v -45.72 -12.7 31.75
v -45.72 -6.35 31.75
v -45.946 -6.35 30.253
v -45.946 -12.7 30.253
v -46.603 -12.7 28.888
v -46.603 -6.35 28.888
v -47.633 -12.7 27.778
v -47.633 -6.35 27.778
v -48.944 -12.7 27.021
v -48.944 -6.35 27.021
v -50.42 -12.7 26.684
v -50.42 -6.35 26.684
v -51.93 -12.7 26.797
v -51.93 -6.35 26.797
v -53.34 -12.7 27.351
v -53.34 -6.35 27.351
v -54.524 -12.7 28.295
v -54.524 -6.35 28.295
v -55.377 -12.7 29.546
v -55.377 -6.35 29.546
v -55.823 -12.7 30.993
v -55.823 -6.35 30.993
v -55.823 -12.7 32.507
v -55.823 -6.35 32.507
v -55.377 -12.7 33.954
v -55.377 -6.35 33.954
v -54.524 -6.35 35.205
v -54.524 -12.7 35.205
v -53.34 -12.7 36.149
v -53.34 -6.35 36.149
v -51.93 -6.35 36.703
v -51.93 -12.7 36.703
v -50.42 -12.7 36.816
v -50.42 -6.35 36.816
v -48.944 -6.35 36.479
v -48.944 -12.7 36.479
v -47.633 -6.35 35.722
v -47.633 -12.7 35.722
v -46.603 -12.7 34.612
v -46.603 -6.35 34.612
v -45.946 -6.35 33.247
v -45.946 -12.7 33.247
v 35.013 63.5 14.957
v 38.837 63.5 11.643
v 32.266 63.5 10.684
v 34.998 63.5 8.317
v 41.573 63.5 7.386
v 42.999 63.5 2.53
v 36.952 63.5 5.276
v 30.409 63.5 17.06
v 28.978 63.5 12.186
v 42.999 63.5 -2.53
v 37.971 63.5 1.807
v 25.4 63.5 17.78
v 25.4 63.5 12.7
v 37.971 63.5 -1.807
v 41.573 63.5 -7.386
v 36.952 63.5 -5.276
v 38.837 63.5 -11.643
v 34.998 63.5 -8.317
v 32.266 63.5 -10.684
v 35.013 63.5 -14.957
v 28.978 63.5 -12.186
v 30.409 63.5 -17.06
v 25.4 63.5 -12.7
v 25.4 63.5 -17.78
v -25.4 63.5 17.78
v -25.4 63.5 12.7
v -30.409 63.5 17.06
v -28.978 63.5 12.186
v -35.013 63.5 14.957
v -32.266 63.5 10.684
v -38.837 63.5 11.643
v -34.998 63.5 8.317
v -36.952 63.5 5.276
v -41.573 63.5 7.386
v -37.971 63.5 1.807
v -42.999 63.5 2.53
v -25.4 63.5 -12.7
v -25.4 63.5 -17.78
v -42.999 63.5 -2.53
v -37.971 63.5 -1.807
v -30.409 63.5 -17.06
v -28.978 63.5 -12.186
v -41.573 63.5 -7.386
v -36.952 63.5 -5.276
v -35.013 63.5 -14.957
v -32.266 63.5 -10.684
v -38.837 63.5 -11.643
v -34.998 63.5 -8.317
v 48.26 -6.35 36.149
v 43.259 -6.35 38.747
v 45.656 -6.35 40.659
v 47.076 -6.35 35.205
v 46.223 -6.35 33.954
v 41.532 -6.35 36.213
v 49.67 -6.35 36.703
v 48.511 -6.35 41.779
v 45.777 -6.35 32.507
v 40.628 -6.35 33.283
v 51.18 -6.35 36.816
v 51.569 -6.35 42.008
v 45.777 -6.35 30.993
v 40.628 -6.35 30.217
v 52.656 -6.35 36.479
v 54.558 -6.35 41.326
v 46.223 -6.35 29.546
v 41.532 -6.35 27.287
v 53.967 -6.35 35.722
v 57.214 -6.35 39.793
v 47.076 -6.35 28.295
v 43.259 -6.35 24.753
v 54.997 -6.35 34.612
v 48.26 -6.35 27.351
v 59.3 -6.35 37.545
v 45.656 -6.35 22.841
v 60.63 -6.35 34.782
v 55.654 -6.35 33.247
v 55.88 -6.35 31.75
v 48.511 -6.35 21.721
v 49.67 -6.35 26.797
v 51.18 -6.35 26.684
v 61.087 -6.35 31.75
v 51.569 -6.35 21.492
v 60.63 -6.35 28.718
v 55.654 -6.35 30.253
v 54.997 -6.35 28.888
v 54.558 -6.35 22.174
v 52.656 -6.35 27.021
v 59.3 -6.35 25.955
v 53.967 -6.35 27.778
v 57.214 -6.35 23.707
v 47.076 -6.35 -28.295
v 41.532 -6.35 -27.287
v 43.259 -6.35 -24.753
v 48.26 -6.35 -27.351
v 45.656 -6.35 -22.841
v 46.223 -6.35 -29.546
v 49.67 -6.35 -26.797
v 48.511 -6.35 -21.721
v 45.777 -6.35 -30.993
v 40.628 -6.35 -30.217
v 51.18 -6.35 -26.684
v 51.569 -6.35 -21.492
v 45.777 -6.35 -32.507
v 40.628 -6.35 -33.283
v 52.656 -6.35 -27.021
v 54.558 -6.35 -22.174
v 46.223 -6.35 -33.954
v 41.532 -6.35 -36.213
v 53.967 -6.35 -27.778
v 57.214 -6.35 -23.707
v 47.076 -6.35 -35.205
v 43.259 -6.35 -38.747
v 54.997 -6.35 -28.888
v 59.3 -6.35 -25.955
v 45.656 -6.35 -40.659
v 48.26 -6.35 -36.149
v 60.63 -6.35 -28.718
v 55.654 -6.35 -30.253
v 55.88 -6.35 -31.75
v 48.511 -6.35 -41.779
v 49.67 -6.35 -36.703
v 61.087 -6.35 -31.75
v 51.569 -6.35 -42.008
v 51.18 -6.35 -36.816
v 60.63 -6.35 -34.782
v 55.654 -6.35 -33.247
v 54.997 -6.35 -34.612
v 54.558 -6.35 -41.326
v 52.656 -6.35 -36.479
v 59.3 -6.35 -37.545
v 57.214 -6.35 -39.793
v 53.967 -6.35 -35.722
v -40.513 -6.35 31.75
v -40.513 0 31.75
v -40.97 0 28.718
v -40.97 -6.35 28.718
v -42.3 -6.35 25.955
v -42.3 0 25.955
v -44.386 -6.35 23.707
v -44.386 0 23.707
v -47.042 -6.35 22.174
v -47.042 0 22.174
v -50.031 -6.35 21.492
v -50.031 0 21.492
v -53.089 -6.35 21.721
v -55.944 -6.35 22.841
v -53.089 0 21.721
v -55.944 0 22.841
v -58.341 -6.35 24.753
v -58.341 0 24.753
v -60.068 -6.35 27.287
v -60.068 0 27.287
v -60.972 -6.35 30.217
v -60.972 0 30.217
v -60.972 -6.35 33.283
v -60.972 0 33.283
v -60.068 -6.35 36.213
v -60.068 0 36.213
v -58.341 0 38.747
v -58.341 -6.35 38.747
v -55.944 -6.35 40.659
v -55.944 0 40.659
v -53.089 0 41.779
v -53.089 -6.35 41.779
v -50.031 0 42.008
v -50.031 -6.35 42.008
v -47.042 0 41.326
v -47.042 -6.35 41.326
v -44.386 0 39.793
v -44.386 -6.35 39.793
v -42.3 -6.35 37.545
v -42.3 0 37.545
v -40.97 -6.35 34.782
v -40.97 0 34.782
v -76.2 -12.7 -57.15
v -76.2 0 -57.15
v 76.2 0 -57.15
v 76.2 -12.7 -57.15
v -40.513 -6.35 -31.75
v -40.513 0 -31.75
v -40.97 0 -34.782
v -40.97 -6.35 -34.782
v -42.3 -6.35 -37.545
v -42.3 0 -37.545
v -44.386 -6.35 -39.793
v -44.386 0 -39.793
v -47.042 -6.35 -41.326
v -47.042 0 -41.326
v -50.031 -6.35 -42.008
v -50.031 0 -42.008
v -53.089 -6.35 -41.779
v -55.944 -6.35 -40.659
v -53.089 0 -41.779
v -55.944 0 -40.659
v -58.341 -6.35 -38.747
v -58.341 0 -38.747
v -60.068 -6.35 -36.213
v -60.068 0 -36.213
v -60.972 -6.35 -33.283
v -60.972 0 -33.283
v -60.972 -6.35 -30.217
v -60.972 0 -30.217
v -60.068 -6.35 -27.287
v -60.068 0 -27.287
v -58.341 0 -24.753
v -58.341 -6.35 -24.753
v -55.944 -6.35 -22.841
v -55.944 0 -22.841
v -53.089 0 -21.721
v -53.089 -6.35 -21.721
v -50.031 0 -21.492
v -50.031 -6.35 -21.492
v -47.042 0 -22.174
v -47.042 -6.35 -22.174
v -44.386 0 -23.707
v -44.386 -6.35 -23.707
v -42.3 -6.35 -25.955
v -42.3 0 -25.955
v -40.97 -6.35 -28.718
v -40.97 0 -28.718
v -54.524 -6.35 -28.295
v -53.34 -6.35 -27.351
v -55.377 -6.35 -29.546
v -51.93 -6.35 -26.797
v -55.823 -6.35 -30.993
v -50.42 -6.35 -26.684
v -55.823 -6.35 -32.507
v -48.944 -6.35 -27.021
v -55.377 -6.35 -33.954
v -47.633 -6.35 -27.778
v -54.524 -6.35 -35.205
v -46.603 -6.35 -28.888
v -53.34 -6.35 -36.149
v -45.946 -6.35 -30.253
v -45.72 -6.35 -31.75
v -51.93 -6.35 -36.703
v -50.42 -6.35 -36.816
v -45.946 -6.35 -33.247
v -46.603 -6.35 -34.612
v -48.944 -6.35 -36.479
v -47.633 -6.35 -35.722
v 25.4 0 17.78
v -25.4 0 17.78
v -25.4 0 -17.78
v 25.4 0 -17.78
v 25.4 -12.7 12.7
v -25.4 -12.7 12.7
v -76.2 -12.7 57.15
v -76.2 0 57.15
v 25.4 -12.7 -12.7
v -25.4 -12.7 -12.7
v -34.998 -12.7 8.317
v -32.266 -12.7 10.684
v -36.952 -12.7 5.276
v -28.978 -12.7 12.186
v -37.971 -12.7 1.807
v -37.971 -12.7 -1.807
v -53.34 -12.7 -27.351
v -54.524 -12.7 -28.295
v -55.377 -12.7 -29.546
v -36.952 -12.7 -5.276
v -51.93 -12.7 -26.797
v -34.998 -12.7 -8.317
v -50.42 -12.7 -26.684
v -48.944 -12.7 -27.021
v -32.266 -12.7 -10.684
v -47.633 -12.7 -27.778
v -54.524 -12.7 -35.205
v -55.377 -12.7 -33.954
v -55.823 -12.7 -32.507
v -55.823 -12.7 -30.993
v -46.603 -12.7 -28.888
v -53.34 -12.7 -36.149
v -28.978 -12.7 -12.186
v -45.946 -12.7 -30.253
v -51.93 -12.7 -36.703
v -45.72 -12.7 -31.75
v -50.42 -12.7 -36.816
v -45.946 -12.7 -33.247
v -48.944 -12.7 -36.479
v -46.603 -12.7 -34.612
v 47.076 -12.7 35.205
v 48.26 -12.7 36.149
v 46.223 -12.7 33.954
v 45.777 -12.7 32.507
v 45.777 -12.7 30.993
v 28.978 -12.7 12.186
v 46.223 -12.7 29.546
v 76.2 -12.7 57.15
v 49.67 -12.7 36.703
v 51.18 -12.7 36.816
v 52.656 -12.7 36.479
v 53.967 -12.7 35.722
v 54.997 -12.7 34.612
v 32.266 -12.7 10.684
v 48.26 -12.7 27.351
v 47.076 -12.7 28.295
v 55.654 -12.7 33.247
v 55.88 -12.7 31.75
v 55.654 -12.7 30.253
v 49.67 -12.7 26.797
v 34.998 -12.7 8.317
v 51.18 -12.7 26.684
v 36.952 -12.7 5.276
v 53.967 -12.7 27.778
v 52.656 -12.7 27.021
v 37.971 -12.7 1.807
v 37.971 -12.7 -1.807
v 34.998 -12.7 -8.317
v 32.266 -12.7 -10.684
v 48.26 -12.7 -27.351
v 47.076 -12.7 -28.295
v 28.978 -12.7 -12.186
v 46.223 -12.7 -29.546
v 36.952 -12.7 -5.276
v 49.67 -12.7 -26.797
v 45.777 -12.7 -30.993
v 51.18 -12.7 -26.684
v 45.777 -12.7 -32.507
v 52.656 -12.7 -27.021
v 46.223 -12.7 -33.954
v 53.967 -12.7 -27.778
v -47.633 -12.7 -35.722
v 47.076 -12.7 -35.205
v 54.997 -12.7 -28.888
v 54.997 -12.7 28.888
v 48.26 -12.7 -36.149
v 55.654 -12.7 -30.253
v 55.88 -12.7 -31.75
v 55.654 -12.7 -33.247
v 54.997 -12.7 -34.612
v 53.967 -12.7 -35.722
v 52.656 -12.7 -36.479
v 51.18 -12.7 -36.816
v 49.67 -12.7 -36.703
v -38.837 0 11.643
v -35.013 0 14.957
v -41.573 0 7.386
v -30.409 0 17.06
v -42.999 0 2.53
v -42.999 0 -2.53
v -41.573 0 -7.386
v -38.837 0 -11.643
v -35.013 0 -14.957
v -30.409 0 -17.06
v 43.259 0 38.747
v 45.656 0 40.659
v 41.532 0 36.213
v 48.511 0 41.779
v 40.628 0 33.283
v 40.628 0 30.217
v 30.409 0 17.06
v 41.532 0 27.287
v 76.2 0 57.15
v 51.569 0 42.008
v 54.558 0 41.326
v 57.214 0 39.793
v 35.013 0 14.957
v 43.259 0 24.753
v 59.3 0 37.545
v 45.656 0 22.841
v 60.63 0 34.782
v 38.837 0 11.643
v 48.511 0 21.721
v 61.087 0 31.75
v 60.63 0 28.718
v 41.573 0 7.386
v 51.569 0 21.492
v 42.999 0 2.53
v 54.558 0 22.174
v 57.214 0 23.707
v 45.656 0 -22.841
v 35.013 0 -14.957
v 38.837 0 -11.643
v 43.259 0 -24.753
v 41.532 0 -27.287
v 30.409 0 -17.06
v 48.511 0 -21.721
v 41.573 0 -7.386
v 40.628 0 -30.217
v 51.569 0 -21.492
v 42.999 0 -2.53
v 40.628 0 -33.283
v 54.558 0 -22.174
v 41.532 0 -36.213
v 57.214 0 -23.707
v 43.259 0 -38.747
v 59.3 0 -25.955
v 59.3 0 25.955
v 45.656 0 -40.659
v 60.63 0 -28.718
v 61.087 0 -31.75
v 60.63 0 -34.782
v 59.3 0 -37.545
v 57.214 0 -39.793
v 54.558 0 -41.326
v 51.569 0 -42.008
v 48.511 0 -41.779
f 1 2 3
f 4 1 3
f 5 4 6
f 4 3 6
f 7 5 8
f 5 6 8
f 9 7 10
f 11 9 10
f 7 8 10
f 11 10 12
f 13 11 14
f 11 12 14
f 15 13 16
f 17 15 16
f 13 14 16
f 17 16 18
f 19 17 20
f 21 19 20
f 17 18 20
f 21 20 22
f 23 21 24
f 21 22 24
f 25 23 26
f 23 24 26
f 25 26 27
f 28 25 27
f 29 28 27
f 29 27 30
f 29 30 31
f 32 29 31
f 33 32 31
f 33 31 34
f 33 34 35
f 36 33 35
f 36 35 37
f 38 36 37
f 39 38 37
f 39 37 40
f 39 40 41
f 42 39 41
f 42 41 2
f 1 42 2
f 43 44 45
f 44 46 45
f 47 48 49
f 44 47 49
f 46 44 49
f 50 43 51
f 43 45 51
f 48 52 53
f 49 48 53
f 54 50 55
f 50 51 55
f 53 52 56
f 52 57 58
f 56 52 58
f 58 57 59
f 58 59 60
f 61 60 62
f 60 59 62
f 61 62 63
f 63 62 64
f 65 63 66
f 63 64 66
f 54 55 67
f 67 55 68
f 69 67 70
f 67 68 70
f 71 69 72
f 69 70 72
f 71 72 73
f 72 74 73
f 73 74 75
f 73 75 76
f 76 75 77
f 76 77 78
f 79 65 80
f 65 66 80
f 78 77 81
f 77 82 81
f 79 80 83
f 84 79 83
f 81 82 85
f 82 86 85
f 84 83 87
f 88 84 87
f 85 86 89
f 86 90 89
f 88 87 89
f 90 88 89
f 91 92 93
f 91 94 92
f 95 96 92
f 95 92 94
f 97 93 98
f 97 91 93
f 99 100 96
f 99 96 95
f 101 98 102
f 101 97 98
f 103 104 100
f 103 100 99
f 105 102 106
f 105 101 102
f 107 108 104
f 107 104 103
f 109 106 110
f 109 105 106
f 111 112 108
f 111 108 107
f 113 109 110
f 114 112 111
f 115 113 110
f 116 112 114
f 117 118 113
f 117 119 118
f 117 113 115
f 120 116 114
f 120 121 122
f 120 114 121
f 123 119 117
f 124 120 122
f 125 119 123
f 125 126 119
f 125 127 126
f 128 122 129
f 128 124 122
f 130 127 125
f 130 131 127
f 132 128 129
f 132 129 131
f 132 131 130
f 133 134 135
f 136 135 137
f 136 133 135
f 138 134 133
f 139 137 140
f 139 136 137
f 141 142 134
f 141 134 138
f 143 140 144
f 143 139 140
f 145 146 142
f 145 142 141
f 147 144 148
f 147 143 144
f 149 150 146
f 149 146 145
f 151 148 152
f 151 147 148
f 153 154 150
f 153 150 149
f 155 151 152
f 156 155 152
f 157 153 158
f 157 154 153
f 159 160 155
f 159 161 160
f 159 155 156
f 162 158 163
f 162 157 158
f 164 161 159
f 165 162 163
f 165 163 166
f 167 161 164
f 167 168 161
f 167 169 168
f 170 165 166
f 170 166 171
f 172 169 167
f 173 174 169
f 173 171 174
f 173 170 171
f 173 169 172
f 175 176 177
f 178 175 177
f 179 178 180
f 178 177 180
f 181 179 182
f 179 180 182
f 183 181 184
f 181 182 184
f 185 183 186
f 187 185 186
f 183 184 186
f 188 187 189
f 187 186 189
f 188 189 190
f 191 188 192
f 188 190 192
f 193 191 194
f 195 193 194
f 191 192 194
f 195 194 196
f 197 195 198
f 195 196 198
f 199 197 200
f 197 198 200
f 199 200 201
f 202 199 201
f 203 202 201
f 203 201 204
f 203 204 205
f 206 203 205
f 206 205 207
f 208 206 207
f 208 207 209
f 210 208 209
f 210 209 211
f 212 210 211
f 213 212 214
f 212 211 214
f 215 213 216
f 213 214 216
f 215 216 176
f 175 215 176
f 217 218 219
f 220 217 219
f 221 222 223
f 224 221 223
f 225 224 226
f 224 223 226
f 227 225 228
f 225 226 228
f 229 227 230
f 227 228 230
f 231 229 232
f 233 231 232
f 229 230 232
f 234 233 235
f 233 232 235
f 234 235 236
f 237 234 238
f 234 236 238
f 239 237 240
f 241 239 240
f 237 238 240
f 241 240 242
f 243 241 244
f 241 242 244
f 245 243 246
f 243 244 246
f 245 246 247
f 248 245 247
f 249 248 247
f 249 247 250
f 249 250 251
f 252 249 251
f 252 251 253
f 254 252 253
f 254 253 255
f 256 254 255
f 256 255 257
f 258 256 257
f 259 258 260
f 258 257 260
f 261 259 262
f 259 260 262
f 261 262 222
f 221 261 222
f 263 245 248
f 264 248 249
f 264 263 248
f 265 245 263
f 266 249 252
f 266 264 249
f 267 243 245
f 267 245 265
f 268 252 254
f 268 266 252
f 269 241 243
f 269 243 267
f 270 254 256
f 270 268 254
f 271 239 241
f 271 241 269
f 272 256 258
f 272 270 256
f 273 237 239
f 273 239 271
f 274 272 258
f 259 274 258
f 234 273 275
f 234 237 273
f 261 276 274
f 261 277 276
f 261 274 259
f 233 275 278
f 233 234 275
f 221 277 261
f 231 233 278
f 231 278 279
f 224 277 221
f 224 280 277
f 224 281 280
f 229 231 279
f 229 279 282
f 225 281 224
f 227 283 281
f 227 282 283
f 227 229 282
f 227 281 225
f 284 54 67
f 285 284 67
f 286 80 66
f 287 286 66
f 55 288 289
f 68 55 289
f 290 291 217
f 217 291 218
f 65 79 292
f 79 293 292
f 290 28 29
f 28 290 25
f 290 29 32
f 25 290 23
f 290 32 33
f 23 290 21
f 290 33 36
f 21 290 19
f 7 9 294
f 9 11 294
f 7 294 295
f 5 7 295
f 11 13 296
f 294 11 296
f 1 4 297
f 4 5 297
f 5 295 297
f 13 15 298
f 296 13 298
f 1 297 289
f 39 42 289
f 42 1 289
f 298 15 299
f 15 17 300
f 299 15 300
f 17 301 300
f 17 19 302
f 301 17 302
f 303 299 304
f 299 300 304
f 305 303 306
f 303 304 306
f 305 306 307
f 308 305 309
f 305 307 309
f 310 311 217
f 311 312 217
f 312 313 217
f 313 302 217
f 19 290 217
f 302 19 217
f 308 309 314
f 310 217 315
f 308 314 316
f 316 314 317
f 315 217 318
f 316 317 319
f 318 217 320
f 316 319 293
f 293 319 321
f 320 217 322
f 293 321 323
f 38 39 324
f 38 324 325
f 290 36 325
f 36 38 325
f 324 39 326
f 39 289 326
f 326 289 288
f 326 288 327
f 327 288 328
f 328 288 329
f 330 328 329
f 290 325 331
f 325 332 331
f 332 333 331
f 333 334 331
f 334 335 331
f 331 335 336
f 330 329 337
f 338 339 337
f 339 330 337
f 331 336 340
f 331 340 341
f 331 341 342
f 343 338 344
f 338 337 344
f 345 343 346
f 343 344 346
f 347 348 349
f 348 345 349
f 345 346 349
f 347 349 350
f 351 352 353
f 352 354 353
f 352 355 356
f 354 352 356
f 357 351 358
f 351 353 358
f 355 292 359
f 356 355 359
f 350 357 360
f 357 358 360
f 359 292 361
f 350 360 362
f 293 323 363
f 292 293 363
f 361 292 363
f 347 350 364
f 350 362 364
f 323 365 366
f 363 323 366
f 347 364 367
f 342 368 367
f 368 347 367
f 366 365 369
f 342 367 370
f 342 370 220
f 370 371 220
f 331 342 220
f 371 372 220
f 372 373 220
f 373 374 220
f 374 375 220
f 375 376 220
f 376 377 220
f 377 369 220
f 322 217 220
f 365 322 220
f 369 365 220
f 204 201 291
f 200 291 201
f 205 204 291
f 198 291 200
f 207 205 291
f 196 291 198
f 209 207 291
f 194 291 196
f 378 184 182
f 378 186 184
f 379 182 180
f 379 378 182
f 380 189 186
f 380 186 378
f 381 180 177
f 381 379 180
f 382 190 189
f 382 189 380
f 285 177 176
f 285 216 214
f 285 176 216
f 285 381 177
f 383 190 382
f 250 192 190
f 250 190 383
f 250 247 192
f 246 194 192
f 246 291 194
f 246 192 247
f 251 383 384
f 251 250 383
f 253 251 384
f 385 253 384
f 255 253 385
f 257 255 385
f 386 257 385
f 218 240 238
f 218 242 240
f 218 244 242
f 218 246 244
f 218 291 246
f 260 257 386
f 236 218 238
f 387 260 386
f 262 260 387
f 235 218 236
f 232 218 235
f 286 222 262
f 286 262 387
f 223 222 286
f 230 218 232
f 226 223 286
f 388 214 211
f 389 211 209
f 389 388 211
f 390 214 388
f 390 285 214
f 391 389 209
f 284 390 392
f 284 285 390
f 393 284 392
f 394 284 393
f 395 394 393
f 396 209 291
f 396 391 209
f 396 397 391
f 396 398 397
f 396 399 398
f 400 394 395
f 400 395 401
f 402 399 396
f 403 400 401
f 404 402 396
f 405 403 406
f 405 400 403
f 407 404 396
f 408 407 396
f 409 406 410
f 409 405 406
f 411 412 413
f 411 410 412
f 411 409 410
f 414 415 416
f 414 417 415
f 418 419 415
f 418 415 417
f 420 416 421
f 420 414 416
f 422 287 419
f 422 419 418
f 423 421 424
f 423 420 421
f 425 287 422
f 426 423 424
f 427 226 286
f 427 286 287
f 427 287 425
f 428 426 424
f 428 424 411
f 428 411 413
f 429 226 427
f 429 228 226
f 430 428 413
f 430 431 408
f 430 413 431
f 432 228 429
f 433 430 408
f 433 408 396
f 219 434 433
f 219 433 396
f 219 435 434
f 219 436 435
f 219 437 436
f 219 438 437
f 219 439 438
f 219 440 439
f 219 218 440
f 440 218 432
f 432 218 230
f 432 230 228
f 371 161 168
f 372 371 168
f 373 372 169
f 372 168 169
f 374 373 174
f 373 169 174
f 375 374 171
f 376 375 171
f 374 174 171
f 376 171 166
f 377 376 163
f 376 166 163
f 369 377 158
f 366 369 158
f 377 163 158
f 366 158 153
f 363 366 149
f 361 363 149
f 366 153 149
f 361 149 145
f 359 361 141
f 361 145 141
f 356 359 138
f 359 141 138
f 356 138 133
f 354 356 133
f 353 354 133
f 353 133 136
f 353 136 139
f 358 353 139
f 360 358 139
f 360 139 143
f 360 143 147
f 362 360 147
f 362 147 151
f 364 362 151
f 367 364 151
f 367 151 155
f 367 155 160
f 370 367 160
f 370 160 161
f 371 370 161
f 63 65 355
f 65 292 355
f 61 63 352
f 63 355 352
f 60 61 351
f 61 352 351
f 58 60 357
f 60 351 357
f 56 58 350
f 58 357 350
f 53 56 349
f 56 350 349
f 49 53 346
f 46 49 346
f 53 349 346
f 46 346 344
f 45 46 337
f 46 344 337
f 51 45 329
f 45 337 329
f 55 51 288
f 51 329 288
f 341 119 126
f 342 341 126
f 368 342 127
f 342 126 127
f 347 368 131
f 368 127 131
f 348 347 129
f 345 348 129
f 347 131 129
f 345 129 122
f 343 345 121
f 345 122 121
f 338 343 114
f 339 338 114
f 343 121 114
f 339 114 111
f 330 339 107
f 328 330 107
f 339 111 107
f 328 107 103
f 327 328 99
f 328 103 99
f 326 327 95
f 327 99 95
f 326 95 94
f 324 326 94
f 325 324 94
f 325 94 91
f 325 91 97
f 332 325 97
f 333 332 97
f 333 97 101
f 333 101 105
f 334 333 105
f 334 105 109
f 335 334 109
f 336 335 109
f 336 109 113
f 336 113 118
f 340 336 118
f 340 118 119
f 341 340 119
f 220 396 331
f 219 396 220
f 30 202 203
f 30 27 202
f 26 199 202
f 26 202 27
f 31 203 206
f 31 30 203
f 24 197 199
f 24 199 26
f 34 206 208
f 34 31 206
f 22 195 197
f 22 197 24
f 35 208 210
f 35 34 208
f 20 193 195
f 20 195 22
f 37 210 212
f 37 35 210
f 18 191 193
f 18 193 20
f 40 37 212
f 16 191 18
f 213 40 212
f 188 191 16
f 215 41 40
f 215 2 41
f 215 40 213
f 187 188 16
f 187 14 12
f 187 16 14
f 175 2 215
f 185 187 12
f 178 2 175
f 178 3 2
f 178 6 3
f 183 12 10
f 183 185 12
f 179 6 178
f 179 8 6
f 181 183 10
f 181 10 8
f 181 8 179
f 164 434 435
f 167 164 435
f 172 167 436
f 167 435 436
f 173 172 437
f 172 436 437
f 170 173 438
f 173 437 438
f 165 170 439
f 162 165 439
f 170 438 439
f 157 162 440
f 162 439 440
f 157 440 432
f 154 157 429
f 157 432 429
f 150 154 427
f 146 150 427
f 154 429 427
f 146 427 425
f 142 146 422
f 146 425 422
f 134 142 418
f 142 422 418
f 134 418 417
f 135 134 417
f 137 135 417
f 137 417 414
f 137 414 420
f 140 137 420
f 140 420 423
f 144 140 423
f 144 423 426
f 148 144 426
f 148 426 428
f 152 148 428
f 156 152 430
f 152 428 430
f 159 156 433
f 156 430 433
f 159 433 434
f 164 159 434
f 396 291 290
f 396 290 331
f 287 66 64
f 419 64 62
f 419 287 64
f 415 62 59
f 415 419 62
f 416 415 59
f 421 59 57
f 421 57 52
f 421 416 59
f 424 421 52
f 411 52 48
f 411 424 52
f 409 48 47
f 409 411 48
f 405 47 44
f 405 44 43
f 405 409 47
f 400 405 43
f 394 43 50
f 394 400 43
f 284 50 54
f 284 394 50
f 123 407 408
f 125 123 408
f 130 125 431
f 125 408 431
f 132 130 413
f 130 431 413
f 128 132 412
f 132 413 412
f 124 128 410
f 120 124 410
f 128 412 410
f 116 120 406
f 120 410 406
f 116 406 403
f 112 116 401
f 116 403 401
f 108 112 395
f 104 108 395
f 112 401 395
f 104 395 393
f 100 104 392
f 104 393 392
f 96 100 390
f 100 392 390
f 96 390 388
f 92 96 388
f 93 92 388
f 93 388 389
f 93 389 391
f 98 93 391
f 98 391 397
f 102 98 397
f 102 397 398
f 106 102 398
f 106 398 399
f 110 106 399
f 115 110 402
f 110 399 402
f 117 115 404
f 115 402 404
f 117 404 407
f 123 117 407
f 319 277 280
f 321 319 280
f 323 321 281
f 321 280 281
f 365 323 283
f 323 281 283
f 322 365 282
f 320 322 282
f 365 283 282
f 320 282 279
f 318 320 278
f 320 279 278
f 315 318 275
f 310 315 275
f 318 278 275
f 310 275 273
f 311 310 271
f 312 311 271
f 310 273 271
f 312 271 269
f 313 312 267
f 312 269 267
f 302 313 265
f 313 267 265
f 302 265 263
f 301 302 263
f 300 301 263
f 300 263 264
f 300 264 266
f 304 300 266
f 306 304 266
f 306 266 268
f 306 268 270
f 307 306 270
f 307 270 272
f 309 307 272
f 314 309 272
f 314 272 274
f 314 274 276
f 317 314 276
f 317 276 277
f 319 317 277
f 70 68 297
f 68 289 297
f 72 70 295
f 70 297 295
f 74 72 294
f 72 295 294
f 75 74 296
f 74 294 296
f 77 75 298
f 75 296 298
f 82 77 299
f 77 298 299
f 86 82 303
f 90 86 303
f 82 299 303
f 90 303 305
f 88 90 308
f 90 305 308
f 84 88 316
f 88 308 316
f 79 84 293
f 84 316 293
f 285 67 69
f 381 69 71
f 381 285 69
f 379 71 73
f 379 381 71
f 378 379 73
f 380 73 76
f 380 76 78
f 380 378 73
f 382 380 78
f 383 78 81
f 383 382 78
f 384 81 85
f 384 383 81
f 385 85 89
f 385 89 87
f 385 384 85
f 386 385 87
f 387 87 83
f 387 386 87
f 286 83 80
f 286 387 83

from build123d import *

# Parameters (mm, degrees)
SKETCH1_W           = 152.4
SKETCH1_H           = 114.3
SKETCH1_R           = 10.287
BOSS_EXTRUDE1_DEPTH = 12.7
EXTRUDE_THIN1_DEPTH = 63.5
SKETCH1_4_R         = 10.287
SKETCH1_4_R_2       = 5.08
BOSS_EXTRUDE2_DEPTH = 12.7
SKETCH1_5_R         = 10.287
SKETCH1_5_R_2       = 5.08
CUT_EXTRUDE1_DEPTH  = 6.35


with BuildPart() as part:
    # Sketch1 → Boss-Extrude1 (new body)
    with BuildSketch(Plane(origin=(0, 0, 0), x_dir=(1, 0, 0), z_dir=(0, 1, 0))):
        Rectangle(SKETCH1_W, SKETCH1_H)
        with Locations((-50.8, 31.75)):
            Circle(SKETCH1_R, mode=Mode.SUBTRACT)
        with Locations((50.8, 31.75)):
            Circle(SKETCH1_R, mode=Mode.SUBTRACT)
        with Locations((50.8, -31.75)):
            Circle(SKETCH1_R, mode=Mode.SUBTRACT)
        with Locations((-50.8, -31.75)):
            Circle(SKETCH1_R, mode=Mode.SUBTRACT)
        with BuildLine():
            ThreePointArc((25.4, -12.7), (38.1, 0), (25.4, 12.7))
            Line((25.4, 12.7), (-25.4, 12.7))
            ThreePointArc((-25.4, 12.7), (-38.1, 0), (-25.4, -12.7))
            Line((-25.4, -12.7), (25.4, -12.7))
        make_face(mode=Mode.SUBTRACT)
    extrude(amount=-BOSS_EXTRUDE1_DEPTH)

    # Sketch1<3> → Extrude-Thin1 (add)
    with BuildSketch(Plane(origin=(0, 0, 0), x_dir=(1, 0, 0), z_dir=(0, 1, 0))):
        with BuildLine():
            Line((25.4, -17.78), (-25.4, -17.78))
            ThreePointArc((-25.4, -17.78), (-43.18, 0), (-25.4, 17.78))
            Line((-25.4, 17.78), (25.4, 17.78))
            ThreePointArc((25.4, 17.78), (43.18, 0), (25.4, -17.78))
        make_face()
        with BuildLine():
            Line((25.4, -12.7), (-25.4, -12.7))
            ThreePointArc((-25.4, -12.7), (-38.1, 0), (-25.4, 12.7))
            Line((-25.4, 12.7), (25.4, 12.7))
            ThreePointArc((25.4, 12.7), (38.1, 0), (25.4, -12.7))
        make_face(mode=Mode.SUBTRACT)
    extrude(amount=EXTRUDE_THIN1_DEPTH)

    # Sketch1<4> → Boss-Extrude2 (add)
    with BuildSketch(Plane(origin=(0, 0, 0), x_dir=(1, 0, 0), z_dir=(0, 1, 0))):
        with Locations((-50.8, 31.75)):
            Circle(SKETCH1_4_R)
        with Locations((-50.8, 31.75)):
            Circle(SKETCH1_4_R_2, mode=Mode.SUBTRACT)
        with Locations((-50.8, -31.75)):
            Circle(SKETCH1_4_R)
        with Locations((-50.8, -31.75)):
            Circle(SKETCH1_4_R_2, mode=Mode.SUBTRACT)
        with Locations((50.8, -31.75)):
            Circle(SKETCH1_4_R)
        with Locations((50.8, -31.75)):
            Circle(SKETCH1_4_R_2, mode=Mode.SUBTRACT)
        with Locations((50.8, 31.75)):
            Circle(SKETCH1_4_R)
        with Locations((50.8, 31.75)):
            Circle(SKETCH1_4_R_2, mode=Mode.SUBTRACT)
    extrude(amount=-BOSS_EXTRUDE2_DEPTH)

    # Sketch1<5> → Cut-Extrude1 (cut)
    with BuildSketch(Plane(origin=(0, 0, 0), x_dir=(1, 0, 0), z_dir=(0, 1, 0))):
        with Locations((-50.8, -31.75)):
            Circle(SKETCH1_5_R)
        with Locations((-50.8, -31.75)):
            Circle(SKETCH1_5_R_2, mode=Mode.SUBTRACT)
        with Locations((-50.8, 31.75)):
            Circle(SKETCH1_5_R)
        with Locations((-50.8, 31.75)):
            Circle(SKETCH1_5_R_2, mode=Mode.SUBTRACT)
        with Locations((50.8, 31.75)):
            Circle(SKETCH1_5_R)
        with Locations((50.8, 31.75)):
            Circle(SKETCH1_5_R_2, mode=Mode.SUBTRACT)
        with Locations((50.8, -31.75)):
            Circle(SKETCH1_5_R)
        with Locations((50.8, -31.75)):
            Circle(SKETCH1_5_R_2, mode=Mode.SUBTRACT)
    extrude(amount=-CUT_EXTRUDE1_DEPTH, mode=Mode.SUBTRACT)


solid = part.part
